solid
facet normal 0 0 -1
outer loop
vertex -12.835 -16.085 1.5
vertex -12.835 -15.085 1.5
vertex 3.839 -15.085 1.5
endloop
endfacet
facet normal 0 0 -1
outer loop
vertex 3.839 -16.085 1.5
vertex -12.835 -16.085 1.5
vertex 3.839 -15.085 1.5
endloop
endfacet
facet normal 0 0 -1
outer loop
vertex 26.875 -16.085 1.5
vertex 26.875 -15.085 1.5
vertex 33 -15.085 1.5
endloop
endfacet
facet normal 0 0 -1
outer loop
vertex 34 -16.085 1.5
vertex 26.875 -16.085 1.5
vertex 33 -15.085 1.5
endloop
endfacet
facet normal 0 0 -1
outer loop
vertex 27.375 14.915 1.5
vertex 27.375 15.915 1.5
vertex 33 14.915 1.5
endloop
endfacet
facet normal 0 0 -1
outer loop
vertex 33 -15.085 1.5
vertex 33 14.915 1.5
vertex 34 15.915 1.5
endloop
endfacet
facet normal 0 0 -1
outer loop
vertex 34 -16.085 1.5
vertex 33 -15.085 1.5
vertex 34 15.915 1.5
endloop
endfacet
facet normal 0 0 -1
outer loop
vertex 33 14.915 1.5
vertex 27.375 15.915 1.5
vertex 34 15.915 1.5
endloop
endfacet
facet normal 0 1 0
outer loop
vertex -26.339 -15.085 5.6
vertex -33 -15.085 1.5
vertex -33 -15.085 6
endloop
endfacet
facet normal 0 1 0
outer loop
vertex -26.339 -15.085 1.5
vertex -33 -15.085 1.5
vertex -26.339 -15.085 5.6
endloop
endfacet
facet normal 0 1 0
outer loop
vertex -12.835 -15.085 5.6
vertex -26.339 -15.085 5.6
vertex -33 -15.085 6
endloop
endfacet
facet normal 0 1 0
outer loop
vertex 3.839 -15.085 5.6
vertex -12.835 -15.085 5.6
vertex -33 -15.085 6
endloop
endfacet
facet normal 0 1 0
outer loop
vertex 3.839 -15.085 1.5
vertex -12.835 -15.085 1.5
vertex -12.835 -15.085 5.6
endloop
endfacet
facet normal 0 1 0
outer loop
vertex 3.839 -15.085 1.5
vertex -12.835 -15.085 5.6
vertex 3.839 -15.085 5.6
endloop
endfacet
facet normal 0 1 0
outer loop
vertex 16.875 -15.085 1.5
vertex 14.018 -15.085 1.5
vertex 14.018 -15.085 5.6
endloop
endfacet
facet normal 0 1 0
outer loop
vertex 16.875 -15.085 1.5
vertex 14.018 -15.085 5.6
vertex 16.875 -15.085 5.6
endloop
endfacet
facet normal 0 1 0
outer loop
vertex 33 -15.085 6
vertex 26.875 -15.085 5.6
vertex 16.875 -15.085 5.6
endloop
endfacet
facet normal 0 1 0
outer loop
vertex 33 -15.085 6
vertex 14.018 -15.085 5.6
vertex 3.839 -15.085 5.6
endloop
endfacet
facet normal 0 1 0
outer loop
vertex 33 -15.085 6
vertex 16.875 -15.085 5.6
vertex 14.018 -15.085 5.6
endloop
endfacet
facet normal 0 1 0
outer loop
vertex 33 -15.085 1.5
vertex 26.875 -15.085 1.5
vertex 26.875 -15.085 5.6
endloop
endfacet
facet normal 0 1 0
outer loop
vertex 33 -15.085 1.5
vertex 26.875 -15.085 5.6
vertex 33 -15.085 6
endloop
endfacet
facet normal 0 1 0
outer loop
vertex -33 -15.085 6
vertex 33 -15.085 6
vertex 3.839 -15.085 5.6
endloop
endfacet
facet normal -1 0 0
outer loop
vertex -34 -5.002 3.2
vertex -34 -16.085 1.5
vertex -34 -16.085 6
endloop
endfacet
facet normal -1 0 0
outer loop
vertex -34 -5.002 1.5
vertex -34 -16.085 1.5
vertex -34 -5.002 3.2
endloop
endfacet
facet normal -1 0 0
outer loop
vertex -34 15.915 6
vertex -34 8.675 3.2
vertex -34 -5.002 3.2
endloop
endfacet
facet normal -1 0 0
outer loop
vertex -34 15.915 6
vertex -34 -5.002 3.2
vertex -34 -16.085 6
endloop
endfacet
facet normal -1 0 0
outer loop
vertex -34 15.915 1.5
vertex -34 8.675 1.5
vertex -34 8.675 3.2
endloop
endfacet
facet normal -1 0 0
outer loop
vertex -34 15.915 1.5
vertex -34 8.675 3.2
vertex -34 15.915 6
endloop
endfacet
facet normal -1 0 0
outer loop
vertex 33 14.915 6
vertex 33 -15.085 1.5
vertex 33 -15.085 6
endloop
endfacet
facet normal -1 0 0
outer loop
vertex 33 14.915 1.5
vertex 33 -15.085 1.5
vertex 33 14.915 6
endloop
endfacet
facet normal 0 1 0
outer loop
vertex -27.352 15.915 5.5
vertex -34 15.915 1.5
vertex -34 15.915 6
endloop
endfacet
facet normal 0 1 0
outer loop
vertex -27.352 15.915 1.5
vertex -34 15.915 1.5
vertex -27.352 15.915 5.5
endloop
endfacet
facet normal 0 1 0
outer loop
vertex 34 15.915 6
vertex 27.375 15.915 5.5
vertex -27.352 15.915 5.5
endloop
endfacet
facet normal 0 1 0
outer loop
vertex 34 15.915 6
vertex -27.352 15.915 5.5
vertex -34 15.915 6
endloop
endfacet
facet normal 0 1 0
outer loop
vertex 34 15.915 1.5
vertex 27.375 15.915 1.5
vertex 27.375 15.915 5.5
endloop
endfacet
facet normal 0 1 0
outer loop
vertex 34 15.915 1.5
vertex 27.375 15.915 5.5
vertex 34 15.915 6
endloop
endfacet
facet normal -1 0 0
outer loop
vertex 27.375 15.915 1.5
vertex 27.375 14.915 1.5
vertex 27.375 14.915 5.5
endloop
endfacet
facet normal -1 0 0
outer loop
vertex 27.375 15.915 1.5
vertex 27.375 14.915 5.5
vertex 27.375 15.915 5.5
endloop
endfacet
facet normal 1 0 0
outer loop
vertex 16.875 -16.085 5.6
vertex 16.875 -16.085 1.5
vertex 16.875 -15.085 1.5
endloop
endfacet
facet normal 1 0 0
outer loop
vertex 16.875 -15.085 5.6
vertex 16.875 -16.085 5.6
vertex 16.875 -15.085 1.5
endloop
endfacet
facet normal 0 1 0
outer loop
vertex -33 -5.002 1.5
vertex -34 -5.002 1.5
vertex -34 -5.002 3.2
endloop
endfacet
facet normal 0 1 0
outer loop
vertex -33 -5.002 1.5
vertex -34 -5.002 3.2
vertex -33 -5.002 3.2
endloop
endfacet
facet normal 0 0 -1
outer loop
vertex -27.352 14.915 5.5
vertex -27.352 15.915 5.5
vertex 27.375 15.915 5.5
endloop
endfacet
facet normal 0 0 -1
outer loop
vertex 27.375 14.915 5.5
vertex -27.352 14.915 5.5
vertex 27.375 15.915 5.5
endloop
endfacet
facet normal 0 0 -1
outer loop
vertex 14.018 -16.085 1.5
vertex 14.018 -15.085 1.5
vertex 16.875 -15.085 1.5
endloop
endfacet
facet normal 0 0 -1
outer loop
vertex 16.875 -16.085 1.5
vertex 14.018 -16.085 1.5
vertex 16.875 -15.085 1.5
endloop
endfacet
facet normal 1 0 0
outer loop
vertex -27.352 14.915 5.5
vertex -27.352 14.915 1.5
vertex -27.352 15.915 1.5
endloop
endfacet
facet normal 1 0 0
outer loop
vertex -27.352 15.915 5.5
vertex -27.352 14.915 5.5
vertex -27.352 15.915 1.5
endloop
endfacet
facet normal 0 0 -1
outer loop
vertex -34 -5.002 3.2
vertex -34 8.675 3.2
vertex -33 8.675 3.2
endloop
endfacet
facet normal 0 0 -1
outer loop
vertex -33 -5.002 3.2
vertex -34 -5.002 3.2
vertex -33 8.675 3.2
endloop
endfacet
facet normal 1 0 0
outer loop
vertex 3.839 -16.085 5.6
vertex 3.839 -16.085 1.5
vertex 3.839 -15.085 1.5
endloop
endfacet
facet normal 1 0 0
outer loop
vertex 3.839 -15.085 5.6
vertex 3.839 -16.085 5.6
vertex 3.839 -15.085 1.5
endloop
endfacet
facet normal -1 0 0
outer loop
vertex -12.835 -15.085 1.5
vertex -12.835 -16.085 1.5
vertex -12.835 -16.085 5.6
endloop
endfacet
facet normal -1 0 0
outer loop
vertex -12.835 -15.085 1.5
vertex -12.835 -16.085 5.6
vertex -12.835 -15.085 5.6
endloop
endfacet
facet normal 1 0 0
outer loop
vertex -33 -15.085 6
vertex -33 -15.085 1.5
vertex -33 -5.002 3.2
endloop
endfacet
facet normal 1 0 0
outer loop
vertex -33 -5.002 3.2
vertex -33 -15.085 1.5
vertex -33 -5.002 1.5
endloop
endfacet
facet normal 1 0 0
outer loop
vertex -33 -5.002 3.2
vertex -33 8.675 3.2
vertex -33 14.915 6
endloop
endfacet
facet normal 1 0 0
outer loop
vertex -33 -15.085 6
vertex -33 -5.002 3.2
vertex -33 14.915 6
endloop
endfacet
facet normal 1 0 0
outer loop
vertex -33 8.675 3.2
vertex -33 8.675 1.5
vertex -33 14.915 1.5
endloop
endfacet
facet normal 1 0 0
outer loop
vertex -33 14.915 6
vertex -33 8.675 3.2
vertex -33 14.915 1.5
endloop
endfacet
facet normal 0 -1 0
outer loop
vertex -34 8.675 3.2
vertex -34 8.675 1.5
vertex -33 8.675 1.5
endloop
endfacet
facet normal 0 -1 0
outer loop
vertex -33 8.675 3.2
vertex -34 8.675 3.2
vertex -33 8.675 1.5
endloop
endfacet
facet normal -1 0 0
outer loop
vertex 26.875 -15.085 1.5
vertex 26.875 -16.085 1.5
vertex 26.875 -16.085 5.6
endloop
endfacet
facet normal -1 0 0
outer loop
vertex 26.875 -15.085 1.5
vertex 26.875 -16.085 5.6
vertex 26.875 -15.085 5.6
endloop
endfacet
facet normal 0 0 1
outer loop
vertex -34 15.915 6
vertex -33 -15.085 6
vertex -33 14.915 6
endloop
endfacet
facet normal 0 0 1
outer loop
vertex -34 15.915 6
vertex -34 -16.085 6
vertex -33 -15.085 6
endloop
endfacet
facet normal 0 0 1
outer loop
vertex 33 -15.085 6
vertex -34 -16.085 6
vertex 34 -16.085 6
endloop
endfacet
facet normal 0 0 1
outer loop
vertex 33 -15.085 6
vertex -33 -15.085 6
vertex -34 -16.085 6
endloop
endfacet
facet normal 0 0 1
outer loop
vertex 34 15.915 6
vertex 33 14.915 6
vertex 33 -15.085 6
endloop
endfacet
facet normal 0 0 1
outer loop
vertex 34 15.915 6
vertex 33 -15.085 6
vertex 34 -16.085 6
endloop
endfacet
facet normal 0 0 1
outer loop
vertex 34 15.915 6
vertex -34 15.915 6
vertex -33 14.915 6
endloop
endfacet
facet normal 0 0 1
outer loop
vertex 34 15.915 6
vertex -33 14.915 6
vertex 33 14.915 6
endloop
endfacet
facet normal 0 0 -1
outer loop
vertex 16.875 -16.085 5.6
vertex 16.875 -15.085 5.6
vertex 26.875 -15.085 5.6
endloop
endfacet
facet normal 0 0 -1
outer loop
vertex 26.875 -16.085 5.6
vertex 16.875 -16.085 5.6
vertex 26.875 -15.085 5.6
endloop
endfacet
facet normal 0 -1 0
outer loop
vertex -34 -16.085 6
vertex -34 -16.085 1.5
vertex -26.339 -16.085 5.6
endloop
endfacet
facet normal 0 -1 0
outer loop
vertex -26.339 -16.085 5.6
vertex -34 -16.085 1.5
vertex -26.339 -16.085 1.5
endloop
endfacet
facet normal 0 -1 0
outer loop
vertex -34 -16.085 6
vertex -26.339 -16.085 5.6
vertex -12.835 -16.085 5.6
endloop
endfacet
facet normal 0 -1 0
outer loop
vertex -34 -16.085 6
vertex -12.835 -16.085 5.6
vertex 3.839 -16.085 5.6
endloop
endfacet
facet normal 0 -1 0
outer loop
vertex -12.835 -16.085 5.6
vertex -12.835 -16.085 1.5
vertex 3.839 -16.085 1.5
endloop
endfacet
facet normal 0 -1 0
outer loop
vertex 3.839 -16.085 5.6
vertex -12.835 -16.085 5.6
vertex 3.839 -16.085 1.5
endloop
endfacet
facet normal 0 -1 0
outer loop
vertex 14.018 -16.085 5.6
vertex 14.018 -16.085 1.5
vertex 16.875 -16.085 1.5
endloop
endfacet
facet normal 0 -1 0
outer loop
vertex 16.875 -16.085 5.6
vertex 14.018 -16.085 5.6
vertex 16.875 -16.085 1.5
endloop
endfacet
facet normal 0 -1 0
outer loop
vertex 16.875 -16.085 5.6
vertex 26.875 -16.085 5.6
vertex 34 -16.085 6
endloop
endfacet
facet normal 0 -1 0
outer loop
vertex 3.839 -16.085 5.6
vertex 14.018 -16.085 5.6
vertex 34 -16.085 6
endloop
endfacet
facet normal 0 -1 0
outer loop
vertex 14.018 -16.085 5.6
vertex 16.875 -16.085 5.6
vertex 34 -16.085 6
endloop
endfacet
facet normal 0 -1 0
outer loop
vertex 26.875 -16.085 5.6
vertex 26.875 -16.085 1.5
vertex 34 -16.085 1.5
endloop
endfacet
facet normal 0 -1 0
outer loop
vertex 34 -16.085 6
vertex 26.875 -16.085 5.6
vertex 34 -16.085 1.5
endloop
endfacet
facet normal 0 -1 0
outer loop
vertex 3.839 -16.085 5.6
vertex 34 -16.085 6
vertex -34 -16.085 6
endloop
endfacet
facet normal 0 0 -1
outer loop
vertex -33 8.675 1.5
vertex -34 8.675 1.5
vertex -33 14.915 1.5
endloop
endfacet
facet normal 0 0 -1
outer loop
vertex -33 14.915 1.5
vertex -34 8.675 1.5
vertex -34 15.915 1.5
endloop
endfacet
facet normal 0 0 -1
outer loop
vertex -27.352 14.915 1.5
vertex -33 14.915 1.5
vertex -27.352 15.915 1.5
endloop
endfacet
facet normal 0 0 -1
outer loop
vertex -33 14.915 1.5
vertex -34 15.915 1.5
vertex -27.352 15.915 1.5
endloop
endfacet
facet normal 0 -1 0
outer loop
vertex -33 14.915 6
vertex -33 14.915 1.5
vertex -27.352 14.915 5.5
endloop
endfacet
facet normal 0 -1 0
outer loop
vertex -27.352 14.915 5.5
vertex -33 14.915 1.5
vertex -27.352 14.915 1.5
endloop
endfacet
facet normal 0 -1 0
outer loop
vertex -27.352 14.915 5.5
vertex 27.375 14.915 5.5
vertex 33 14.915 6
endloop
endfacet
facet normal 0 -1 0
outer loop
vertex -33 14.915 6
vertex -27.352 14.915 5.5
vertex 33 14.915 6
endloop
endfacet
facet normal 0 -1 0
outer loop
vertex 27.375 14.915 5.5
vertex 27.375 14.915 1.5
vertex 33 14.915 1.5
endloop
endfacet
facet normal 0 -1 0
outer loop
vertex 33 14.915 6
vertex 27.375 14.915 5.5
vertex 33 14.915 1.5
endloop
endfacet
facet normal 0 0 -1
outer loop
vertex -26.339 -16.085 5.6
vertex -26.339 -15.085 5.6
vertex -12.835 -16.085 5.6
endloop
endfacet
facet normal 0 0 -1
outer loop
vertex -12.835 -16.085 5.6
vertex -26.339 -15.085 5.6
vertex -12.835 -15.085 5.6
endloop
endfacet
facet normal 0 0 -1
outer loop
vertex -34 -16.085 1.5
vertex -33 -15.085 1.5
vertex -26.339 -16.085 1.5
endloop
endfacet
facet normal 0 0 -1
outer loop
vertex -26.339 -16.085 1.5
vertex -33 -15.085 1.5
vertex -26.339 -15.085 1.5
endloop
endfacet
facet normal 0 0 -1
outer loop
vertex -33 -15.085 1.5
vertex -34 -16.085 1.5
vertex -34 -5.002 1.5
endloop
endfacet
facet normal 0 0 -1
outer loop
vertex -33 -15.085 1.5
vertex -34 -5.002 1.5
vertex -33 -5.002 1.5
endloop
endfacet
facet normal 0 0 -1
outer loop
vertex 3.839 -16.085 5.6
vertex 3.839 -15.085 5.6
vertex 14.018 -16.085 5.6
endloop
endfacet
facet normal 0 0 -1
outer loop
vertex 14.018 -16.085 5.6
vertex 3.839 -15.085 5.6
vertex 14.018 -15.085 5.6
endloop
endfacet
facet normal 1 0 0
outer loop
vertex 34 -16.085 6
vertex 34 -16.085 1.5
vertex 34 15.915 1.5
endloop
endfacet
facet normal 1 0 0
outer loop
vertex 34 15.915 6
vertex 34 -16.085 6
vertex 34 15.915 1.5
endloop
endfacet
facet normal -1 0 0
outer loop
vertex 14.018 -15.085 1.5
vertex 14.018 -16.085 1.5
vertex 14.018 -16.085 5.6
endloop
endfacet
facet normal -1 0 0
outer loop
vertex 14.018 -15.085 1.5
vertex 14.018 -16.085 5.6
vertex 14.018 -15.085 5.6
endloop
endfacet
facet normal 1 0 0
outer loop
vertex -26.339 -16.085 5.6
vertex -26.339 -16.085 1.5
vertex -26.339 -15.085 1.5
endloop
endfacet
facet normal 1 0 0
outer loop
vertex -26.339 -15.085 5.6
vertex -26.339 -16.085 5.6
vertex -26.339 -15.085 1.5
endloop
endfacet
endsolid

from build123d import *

# Parameters (mm, degrees)
F2_START = 1.5
F0_W     = 68
F0_H     = 32
F0_W_2   = 66.0000007396
F0_H_2   = 30
F2_DEPTH = 4.5
F5_START = 0.9
F3_W     = 9.7086578608
F3_H     = 13.6771607213
F5_DEPTH = 2.3
F6_START = 1
F1_W     = 13.5039854795
F1_H     = 7.9890675843
F1_W_2   = 10.1785697043
F1_W_3   = 10.0000035018
F1_H_2   = 7.8571438789
F6_DEPTH = 4.6
F7_START = 1.5
F4_W     = 54.7266360372
F4_H     = 8.1930877641
F7_DEPTH = 4


with BuildPart() as f2:
    # F0 (on Top) → F2 (new body)
    with BuildSketch(Plane.XY.offset(F2_START)):
        with Locations((0, -0.0852976367)):
            Rectangle(F0_W, F0_H)
        with Locations((0, -0.0852976367)):
            Rectangle(F0_W_2, F0_H_2, mode=Mode.SUBTRACT)
    extrude(amount=F2_DEPTH)

    # F3 (on Top) → F5 (cut)
    with BuildSketch(Plane.XY.offset(F5_START)):
        with Locations((-30.4173231125, 1.8361529801)):
            Rectangle(F3_W, F3_H)
    extrude(amount=F5_DEPTH, mode=Mode.SUBTRACT)

    # F1 (on Top) → F6 (cut)
    with BuildSketch(Plane.XY.offset(F6_START)):
        with Locations((-19.5872941986, -13.5481059551)):
            Rectangle(F1_W, F1_H)
        with Locations((8.9285718277, -13.5481059551)):
            Rectangle(F1_W_2, F1_H)
        with Locations((21.8750005588, -13.4821441025)):
            Rectangle(F1_W_3, F1_H_2)
    extrude(amount=F6_DEPTH, mode=Mode.SUBTRACT)

    # F4 (on Top) → F7 (cut)
    with BuildSketch(Plane.XY.offset(F7_START)):
        with Locations((0.0114953145, 13.3686042391)):
            Rectangle(F4_W, F4_H)
    extrude(amount=F7_DEPTH, mode=Mode.SUBTRACT)


solid = f2.part
